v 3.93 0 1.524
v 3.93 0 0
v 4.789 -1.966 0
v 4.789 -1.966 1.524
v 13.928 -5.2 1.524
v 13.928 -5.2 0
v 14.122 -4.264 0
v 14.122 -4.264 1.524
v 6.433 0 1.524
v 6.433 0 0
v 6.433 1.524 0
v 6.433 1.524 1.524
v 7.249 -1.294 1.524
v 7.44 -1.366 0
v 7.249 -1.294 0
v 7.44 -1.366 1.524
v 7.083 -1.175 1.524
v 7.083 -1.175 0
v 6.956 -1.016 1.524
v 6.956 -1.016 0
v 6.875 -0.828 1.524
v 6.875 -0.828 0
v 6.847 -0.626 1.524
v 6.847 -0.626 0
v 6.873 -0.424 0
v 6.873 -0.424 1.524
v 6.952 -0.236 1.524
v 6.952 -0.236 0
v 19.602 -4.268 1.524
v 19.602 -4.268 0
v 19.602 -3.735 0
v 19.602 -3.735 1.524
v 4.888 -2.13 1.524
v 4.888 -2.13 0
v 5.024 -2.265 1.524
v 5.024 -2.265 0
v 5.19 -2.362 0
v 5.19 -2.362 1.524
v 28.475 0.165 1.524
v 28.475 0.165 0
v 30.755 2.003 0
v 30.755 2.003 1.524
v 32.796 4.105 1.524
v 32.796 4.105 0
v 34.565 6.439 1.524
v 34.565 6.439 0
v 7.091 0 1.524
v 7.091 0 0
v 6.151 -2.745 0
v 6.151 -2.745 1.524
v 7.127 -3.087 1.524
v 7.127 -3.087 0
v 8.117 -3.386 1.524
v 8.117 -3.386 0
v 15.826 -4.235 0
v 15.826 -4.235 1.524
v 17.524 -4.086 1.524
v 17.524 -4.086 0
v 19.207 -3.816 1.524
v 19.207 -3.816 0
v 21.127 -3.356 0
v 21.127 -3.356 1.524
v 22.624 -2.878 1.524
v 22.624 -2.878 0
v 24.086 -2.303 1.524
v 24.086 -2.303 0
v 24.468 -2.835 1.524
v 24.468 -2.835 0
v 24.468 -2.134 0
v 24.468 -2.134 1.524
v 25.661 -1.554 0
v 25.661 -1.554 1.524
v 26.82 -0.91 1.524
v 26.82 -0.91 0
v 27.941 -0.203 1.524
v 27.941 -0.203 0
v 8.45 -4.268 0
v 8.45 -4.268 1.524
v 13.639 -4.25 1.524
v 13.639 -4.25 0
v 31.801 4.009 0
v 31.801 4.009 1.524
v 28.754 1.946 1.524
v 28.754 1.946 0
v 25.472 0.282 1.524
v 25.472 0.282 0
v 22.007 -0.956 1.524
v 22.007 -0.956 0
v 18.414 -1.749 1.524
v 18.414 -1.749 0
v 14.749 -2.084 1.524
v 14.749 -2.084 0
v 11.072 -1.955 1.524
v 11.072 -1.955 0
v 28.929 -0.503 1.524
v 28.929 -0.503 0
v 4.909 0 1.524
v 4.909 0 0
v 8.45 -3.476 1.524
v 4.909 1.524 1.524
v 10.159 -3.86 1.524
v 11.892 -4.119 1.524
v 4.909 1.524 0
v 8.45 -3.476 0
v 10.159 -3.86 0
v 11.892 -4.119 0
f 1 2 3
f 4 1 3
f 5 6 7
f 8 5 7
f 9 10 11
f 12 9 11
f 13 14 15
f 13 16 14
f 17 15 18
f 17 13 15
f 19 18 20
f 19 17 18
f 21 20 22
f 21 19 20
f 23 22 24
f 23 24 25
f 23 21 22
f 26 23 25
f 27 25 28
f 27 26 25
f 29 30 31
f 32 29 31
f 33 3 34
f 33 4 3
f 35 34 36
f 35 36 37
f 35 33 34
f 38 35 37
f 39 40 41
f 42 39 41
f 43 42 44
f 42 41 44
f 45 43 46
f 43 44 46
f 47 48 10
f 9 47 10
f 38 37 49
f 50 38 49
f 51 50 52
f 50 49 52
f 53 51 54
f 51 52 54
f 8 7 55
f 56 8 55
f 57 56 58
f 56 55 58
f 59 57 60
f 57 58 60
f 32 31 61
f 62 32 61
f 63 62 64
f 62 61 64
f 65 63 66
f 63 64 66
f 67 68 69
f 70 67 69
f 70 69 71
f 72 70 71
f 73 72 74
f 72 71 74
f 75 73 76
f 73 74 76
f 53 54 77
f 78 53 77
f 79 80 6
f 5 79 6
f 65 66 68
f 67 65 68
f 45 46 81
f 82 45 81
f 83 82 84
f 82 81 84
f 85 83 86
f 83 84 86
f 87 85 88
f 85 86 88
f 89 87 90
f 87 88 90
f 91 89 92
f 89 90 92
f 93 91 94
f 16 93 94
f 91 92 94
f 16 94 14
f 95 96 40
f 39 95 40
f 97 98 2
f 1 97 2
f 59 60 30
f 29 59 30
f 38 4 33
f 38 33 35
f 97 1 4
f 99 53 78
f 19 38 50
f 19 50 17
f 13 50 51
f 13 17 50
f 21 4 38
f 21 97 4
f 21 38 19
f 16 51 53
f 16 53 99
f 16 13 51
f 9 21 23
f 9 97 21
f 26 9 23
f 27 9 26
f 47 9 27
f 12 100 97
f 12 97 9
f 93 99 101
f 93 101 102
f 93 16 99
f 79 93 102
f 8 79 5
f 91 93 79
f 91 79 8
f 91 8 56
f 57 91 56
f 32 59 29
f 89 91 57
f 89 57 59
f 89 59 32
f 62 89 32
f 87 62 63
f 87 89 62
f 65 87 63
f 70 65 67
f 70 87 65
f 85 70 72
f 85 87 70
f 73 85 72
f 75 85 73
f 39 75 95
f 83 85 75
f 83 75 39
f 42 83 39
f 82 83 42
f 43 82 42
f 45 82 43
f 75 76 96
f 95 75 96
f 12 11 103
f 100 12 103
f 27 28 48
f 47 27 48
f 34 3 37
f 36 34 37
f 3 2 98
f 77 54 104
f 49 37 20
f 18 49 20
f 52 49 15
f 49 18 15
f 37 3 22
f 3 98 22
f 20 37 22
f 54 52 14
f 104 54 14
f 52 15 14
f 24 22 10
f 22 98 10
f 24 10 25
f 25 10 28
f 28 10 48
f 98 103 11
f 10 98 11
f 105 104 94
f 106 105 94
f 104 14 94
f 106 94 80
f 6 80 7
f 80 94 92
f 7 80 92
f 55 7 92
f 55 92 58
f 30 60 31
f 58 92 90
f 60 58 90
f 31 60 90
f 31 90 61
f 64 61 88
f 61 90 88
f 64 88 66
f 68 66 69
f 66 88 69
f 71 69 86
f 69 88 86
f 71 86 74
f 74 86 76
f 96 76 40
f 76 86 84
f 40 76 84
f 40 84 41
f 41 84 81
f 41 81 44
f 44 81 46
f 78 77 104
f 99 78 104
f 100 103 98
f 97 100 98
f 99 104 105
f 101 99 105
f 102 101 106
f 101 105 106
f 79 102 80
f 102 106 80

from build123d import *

# Parameters (mm, degrees)
BOSS_EXTRUDE1_DEPTH = 1.524
FILLET1_R           = 0.762
FILLET2_R           = 0.762


with BuildPart() as part:
    # Sketch1 → Boss-Extrude1 (new body)
    with BuildSketch(Plane.XY):
        with BuildLine():
            Line((6.433464338, 1.524), (4.909464338, 1.524))
            Line((4.909464338, 1.524), (4.909464338, 0))
            Line((4.909464338, 0), (3.929779176, 0))
            Line((3.929779176, 0), (4.909464338, -2.240840662))
            ThreePointArc((4.909464338, -2.240840662), (6.492968468, -2.870194257), (8.117099911, -3.385721496))
            Line((8.117099911, -3.385721496), (8.449939435, -4.268236242))
            Line((8.449939435, -4.268236242), (8.449939435, -3.47594469))
            ThreePointArc((8.449939435, -3.47594469), (11.023079362, -4.00513675), (13.638615108, -4.250220566))
            Line((13.638615108, -4.250220566), (13.928033002, -5.200165059))
            Line((13.928033002, -5.200165059), (14.121765671, -4.264076161))
            ThreePointArc((14.121765671, -4.264076161), (16.676471214, -4.175606926), (19.207315416, -3.816197909))
            Line((19.207315416, -3.816197909), (19.602084403, -4.268236242))
            Line((19.602084403, -4.268236242), (19.602084403, -3.735071341))
            ThreePointArc((19.602084403, -3.735071341), (21.879297331, -3.128958074), (24.086174716, -2.302662594))
            Line((24.086174716, -2.302662594), (24.468474935, -2.834558551))
            Line((24.468474935, -2.834558551), (24.468474935, -2.133758289))
            ThreePointArc((24.468474935, -2.133758289), (26.244740547, -1.240138243), (27.941024881, -0.202691489))
            Line((27.941024881, -0.202691489), (28.929332922, -0.502746421))
            Line((28.929332922, -0.502746421), (28.474650124, 0.165358914))
            ThreePointArc((28.474650124, 0.165358914), (31.807513974, 3.022993189), (34.564707679, 6.439414997))
            ThreePointArc((34.564707679, 6.439414997), (21.508001683, -1.0948152), (6.433464338, -1.117618174))
            Line((6.433464338, -1.117618174), (7.091019013, 0))
            Line((7.091019013, 0), (6.433464338, 0))
            Line((6.433464338, 0), (6.433464338, 1.524))
        make_face()
    extrude(amount=BOSS_EXTRUDE1_DEPTH)

    # Fillet1
    fillet1_edges = [part.edges().sort_by_distance(p)[0] for p in [
        (6.433464338, -1.117618174, 0.762),
    ]]
    fillet(fillet1_edges, radius=FILLET1_R)

    # Fillet2
    fillet2_edges = [part.edges().sort_by_distance(p)[0] for p in [
        (4.909464338, -2.240840662, 0.762),
    ]]
    fillet(fillet2_edges, radius=FILLET2_R)


solid = part.part
